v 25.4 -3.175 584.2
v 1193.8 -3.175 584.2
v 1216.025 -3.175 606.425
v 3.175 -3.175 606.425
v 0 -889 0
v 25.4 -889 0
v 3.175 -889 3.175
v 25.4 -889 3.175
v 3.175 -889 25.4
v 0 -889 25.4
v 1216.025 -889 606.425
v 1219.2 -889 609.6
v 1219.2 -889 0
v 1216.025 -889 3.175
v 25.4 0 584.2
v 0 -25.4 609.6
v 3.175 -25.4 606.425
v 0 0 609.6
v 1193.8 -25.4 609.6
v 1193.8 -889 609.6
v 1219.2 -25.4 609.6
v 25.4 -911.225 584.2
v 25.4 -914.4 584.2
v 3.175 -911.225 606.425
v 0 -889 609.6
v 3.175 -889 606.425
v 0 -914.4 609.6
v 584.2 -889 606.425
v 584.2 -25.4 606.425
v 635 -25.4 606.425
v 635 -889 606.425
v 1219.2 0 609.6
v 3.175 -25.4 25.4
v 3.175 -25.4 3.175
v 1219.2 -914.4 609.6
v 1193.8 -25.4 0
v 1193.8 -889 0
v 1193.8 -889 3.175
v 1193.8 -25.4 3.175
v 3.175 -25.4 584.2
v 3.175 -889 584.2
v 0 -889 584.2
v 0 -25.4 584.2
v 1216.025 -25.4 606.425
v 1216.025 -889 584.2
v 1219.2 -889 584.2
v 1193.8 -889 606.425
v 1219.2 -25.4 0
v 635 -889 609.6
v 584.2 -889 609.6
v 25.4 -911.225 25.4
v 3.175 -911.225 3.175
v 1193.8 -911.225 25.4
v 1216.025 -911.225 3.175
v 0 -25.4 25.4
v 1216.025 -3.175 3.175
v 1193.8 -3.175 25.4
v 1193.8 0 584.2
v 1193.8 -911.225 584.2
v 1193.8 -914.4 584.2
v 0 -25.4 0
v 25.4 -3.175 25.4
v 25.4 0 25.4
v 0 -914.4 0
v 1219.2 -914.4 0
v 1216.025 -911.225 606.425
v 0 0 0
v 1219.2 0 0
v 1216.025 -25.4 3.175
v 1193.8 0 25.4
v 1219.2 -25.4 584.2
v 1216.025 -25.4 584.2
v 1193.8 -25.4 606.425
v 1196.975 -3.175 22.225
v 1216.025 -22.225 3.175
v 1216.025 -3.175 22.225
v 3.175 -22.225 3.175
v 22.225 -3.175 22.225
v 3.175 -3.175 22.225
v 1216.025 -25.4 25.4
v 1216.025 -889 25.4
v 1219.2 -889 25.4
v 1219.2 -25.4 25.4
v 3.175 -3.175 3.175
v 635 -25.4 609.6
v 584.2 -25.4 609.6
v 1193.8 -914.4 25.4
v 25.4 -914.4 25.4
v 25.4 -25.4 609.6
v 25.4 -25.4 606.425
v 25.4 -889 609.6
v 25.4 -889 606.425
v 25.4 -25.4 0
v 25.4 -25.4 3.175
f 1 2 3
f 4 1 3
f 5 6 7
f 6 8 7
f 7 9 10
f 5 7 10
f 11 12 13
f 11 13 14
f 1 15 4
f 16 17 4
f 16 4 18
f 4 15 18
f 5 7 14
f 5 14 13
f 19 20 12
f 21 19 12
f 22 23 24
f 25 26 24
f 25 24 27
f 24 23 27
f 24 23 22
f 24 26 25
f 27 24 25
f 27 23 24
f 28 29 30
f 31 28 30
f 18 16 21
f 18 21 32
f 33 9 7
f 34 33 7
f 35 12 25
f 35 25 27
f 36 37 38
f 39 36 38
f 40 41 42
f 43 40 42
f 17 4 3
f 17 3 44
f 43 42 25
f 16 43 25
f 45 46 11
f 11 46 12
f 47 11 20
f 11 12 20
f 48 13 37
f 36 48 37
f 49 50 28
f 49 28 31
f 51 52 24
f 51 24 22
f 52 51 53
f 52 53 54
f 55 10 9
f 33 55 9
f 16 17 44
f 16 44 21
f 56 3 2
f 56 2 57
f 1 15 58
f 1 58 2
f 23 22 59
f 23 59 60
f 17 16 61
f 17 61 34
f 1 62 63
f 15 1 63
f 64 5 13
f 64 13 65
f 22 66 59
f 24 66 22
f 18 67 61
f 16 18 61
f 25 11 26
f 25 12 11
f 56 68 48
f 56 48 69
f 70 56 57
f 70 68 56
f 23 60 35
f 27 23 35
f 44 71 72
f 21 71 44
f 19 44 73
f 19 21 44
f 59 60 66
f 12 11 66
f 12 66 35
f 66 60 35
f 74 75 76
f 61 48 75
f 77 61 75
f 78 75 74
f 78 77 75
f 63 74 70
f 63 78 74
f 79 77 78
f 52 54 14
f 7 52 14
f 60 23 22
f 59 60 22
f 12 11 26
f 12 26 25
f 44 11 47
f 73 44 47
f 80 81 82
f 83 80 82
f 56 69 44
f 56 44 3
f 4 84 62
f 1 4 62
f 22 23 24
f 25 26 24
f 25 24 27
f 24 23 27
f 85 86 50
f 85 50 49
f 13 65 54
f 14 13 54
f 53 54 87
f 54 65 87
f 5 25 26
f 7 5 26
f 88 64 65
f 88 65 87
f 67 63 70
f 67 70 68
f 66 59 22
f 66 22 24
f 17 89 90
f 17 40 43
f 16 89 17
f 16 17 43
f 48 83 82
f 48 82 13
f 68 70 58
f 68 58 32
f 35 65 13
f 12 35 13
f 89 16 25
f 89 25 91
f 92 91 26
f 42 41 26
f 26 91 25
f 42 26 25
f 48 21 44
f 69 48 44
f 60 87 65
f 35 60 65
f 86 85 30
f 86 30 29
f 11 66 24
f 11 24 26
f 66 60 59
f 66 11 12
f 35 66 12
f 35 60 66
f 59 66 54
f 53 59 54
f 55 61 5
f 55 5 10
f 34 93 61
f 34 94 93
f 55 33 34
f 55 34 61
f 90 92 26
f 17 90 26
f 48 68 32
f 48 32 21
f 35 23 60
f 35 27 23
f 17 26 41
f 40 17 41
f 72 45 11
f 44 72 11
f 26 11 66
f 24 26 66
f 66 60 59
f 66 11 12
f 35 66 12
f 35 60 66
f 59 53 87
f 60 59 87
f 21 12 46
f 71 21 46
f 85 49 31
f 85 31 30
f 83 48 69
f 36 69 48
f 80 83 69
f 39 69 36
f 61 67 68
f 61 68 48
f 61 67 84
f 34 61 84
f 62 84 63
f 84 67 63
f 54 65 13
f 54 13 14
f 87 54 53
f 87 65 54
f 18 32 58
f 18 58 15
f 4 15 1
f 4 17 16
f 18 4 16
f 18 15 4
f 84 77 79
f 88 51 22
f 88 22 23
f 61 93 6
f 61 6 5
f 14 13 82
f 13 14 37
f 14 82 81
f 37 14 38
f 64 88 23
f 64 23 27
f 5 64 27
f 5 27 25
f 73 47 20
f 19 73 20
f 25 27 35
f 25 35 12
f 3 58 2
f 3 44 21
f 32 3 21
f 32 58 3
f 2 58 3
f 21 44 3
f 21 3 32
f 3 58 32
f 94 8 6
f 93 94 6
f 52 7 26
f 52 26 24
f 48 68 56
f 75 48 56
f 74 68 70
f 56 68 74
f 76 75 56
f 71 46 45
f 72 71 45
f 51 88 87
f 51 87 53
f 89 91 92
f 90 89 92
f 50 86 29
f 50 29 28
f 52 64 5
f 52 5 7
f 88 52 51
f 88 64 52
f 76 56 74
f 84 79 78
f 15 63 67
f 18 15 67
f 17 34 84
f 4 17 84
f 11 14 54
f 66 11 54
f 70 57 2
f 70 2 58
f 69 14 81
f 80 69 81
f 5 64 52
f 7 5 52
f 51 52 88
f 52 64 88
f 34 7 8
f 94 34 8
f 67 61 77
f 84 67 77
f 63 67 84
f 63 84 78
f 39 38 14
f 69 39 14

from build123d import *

# Parameters (mm, degrees)
F1_DEPTH  = 609.6
F3_DEPTH  = 25.401
F9_DEPTH  = 1219.2
F12_DEPTH = 1219.2
F15_DEPTH = 1219.2
F18_DEPTH = 863.6
F20_DEPTH = 3.175


with BuildPart() as f1:
    # F0 (on Top) → F1 (new body)
    with BuildSketch(Plane.XY):
        Polygon((25.4, 0), (0, 0), (0, -25.4), (3.175, -25.4), (3.175, -3.175), (25.4, -3.175), align=None)
    extrude(amount=F1_DEPTH)

    # F2 (on face) → F3 (cut, through all)
    with BuildSketch(Plane(origin=(0, 0, 0), x_dir=(-1, 0, 0), z_dir=(0, 1, 0))):
        Polygon((-25.4, 584.2), (0, 609.6), (-25.4, 609.6), align=None)
        Polygon((-25.4, 0), (0, 0), (-25.4, 25.4), align=None)
    extrude(amount=-F3_DEPTH, mode=Mode.SUBTRACT)


with BuildPart() as f4_1:
    # F4: instance of F1
    add(f1.part.mirror(Plane(origin=(25.4, -1.5875, 304.8), x_dir=(0, 1, 0), z_dir=(1, 0, 0))))


with BuildPart() as f4_1_1:
    # F5: moved
    add(f4_1.part.moved(Location((1168.4, 0, 0))))


with BuildPart() as f7_1:
    # F7: instance of F1
    add(f1.part.mirror(Plane.XZ.offset(457.2)))


with BuildPart() as f7_2:
    # F7: instance of F4_1
    add(f4_1_1.part.mirror(Plane.XZ.offset(457.2)))


with BuildPart() as f9:
    # F8 (on face) → F9 (new body, through all)
    with BuildSketch(Plane(origin=(0, 0, 0), x_dir=(0, -1, 0), z_dir=(-1, 0, 0))):
        Polygon((25.4, 606.425), (25.4, 609.6), (0, 609.6), (0, 584.2), (3.175, 584.2), (3.175, 606.425), align=None)
    extrude(amount=-F9_DEPTH)

    # F10: cut F4_1, F1
    add(f4_1_1.part, mode=Mode.SUBTRACT)
    add(f1.part, mode=Mode.SUBTRACT)


with BuildPart() as f9b:
    # F8 (on face) → F9, piece 2 (new body, through all)
    with BuildSketch(Plane(origin=(0, 0, 0), x_dir=(0, -1, 0), z_dir=(-1, 0, 0))):
        Polygon((0, 0), (25.4, 0), (0, 25.4), align=None)
    extrude(amount=-F9_DEPTH)

    # F10: cut F4_1, F1
    add(f4_1_1.part, mode=Mode.SUBTRACT)
    add(f1.part, mode=Mode.SUBTRACT)


with BuildPart() as f12:
    # F11 (on face) → F12 (new body, through all)
    with BuildSketch(Plane(origin=(0, 0, 0), x_dir=(0, -1, 0), z_dir=(-1, 0, 0))):
        Polygon((889, 3.175), (889, 0), (914.4, 0), (914.4, 25.4), (911.225, 25.4), (911.225, 3.175), align=None)
    extrude(amount=-F12_DEPTH)

    # F13: cut F7_1, F7_2
    add(f7_1.part, mode=Mode.SUBTRACT)
    add(f7_2.part, mode=Mode.SUBTRACT)


with BuildPart() as f12b:
    # F11 (on face) → F12, piece 2 (new body, through all)
    with BuildSketch(Plane(origin=(0, 0, 0), x_dir=(0, -1, 0), z_dir=(-1, 0, 0))):
        Polygon((914.4, 609.6), (889, 609.6), (889, 606.425), (911.225, 606.425), (911.225, 584.2), (914.4, 584.2), align=None)
    extrude(amount=-F12_DEPTH)

    # F13: cut F7_1, F7_2
    add(f7_1.part, mode=Mode.SUBTRACT)
    add(f7_2.part, mode=Mode.SUBTRACT)


with BuildPart() as f15:
    # F14 (on face) → F15 (new body, through all)
    with BuildSketch(Plane.YZ.offset(1219.2)):
        Polygon((-889, 606.425), (-889, 609.6), (-914.4, 609.6), (-914.4, 584.2), (-911.225, 584.2), (-911.225, 606.425), align=None)
    extrude(amount=-F15_DEPTH)

    # F16: cut F7_2, F7_1
    add(f7_2.part, mode=Mode.SUBTRACT)
    add(f7_1.part, mode=Mode.SUBTRACT)


with BuildPart() as f18:
    # F17 (on face) → F18 (new body, through all)
    with BuildSketch(Plane(origin=(0, -889, 0), x_dir=(-1, 0, 0), z_dir=(0, 1, 0))):
        Polygon((0, 609.6), (-25.4, 609.6), (-25.4, 606.425), (-3.175, 606.425), (-3.175, 584.2), (0, 584.2), align=None)
    extrude(amount=F18_DEPTH)


with BuildPart() as f18b:
    # F17 (on face) → F18, piece 2 (new body, through all)
    with BuildSketch(Plane(origin=(0, -889, 0), x_dir=(-1, 0, 0), z_dir=(0, 1, 0))):
        Polygon((-1193.8, 606.425), (-1193.8, 609.6), (-1219.2, 609.6), (-1219.2, 584.2), (-1216.025, 584.2), (-1216.025, 606.425), align=None)
    extrude(amount=F18_DEPTH)


with BuildPart() as f18c:
    # F17 (on face) → F18, piece 3 (new body, through all)
    with BuildSketch(Plane(origin=(0, -889, 0), x_dir=(-1, 0, 0), z_dir=(0, 1, 0))):
        Polygon((-1219.2, 25.4), (-1219.2, 0), (-1193.8, 0), (-1193.8, 3.175), (-1216.025, 3.175), (-1216.025, 25.4), align=None)
    extrude(amount=F18_DEPTH)


with BuildPart() as f18d:
    # F17 (on face) → F18, piece 4 (new body, through all)
    with BuildSketch(Plane(origin=(0, -889, 0), x_dir=(-1, 0, 0), z_dir=(0, 1, 0))):
        Polygon((-25.4, 0), (0, 0), (0, 25.4), (-3.175, 25.4), (-3.175, 3.175), (-25.4, 3.175), align=None)
    extrude(amount=F18_DEPTH)


with BuildPart() as f20:
    # F19 (on face) → F20 (new body, through all)
    with BuildSketch(Plane.XY.offset(609.6)):
        Polygon((635.0000000003, -25.4), (609.6000000006, -25.4), (584.2000000003, -25.4), (584.2000000003, -889), (635.0000000003, -889), align=None)
    extrude(amount=-F20_DEPTH)


solid = Compound([f1.part, f4_1_1.part, f7_1.part, f7_2.part, f9.part, f9b.part, f12.part, f12b.part, f15.part, f18.part, f18b.part, f18c.part, f18d.part, f20.part])
